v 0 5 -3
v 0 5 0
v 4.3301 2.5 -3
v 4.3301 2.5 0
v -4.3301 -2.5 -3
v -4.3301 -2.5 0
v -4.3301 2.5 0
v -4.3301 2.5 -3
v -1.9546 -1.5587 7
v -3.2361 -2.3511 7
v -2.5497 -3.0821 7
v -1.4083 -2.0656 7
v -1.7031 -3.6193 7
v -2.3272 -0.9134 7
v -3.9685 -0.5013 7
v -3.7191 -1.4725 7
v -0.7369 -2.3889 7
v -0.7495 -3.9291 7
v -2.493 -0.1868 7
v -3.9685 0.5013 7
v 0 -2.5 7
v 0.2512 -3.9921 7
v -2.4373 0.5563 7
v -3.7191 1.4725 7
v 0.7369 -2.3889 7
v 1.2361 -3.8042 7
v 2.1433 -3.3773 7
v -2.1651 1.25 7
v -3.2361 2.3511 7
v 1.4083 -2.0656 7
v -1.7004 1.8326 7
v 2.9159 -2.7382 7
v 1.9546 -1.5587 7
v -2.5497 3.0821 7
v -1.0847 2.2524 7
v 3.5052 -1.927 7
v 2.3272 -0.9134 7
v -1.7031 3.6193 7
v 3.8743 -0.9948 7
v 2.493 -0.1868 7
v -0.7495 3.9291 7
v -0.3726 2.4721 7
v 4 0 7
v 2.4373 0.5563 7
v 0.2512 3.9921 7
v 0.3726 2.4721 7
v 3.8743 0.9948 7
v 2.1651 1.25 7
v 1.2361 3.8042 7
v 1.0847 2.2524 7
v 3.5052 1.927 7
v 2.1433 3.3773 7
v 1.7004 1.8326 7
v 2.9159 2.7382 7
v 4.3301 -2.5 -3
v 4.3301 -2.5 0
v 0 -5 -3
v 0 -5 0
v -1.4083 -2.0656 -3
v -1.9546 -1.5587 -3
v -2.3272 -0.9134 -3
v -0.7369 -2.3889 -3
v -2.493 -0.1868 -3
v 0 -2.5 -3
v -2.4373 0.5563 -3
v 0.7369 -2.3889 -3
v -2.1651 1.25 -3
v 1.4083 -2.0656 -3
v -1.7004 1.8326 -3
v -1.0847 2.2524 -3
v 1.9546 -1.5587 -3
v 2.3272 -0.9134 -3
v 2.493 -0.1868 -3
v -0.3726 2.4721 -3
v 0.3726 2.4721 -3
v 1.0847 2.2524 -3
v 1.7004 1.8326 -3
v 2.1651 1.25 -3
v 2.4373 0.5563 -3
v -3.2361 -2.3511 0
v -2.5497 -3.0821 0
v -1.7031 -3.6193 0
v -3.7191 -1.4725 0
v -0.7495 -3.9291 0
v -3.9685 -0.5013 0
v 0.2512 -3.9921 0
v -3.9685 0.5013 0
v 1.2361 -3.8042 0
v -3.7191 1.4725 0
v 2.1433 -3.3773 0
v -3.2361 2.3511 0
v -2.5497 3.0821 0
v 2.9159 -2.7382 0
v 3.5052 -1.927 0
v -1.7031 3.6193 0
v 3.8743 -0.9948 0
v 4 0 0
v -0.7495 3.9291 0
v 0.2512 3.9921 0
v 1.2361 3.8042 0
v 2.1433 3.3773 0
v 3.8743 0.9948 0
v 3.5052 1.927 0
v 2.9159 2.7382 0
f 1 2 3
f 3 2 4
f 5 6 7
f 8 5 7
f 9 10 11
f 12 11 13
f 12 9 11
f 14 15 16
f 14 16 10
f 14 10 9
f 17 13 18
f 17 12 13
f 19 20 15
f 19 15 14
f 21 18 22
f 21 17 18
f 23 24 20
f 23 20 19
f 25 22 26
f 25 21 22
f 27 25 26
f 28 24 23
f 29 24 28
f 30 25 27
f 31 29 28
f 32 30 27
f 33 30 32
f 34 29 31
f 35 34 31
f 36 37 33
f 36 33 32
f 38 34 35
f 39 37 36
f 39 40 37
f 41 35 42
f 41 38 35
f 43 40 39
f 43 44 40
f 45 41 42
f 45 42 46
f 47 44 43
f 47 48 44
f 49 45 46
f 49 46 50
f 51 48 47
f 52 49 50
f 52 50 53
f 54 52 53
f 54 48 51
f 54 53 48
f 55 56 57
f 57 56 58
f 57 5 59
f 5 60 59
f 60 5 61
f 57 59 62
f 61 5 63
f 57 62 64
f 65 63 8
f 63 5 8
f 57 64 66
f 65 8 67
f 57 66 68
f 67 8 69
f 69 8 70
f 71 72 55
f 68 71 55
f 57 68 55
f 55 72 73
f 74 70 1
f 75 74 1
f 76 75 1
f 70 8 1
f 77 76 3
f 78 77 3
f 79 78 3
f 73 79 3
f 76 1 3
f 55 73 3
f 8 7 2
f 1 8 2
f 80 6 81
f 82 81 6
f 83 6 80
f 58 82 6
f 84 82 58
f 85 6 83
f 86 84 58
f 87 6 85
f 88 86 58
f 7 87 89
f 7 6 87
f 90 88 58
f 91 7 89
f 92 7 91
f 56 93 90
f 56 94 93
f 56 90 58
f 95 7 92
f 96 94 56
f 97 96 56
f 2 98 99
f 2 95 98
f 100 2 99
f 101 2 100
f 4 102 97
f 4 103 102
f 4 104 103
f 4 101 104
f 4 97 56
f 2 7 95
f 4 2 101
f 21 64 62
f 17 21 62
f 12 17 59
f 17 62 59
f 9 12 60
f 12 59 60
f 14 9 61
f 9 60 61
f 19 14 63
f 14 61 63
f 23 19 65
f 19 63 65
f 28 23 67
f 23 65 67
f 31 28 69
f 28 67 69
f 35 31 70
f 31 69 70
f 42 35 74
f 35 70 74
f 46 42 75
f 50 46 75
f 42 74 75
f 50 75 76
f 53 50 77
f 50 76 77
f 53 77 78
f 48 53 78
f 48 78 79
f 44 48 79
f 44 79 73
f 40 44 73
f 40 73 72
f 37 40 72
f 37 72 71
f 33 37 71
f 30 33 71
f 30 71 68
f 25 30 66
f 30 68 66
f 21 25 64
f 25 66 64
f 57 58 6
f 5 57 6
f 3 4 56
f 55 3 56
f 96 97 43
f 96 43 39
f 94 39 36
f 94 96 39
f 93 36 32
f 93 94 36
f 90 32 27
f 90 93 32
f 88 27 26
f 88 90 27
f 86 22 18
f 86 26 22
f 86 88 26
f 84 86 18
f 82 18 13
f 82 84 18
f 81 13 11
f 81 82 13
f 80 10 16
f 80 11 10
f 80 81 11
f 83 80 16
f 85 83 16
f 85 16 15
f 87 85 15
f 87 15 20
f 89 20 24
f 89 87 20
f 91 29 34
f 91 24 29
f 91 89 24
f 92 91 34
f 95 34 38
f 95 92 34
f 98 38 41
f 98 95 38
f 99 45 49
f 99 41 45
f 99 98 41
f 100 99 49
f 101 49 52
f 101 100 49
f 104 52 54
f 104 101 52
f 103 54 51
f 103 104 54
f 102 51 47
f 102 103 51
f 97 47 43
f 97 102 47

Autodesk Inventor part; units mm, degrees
ref_plane "YZ Plane" through (0, 0, 0) normal (1, 0, 0) x (0, 1, 0)
ref_plane "XZ Plane" through (0, 0, 0) normal (0, 1, 0) x (-1, 0, 0)
ref_plane "XY Plane" through (0, 0, 0) normal (0, 0, 1) x (1, 0, 0)
sketch "Sketch1" plane through (0, 0, 0) normal (0, 0, 1) x (1, 0, 0)
  line L0 (0, 5) -> (4.3301, 2.5)
  line L1 (4.3301, 2.5) -> (4.3301, -2.5)
  line L2 (4.3301, -2.5) -> (0, -5)
  line L3 (0, -5) -> (-4.3301, -2.5)
  line L4 (-4.3301, -2.5) -> (-4.3301, 2.5)
  line L5 (-4.3301, 2.5) -> (0, 5)
  point P0 (0, 0)
  point P1 (0, 0)
  dimension "d0" = 10
extrude "Extrusion1" add sketch "Sketch1" against normal blind 3
sketch "Sketch2" plane through (0, 0, 0) normal (0, 0, 1) x (1, 0, 0)
  circle A0 centre (0, 0) radius 4
  dimension "d3" = 8
extrude "Extrusion2" add sketch "Sketch2" along normal blind 7
sketch "Sketch3" plane through (0, 0, 7) normal (0, 0, 1) x (1, 0, 0)
  circle A0 centre (0, 0) radius 4 projected
hole "Hole1" at (0, 0, 7) direction (0, 0, -1) diameter 5 depth 10
thread "Thread1" size "M8x1.25" class "6g" standard "ANSI Metric M Profile" full length
properties part number "156 part 2" material "Gold"
